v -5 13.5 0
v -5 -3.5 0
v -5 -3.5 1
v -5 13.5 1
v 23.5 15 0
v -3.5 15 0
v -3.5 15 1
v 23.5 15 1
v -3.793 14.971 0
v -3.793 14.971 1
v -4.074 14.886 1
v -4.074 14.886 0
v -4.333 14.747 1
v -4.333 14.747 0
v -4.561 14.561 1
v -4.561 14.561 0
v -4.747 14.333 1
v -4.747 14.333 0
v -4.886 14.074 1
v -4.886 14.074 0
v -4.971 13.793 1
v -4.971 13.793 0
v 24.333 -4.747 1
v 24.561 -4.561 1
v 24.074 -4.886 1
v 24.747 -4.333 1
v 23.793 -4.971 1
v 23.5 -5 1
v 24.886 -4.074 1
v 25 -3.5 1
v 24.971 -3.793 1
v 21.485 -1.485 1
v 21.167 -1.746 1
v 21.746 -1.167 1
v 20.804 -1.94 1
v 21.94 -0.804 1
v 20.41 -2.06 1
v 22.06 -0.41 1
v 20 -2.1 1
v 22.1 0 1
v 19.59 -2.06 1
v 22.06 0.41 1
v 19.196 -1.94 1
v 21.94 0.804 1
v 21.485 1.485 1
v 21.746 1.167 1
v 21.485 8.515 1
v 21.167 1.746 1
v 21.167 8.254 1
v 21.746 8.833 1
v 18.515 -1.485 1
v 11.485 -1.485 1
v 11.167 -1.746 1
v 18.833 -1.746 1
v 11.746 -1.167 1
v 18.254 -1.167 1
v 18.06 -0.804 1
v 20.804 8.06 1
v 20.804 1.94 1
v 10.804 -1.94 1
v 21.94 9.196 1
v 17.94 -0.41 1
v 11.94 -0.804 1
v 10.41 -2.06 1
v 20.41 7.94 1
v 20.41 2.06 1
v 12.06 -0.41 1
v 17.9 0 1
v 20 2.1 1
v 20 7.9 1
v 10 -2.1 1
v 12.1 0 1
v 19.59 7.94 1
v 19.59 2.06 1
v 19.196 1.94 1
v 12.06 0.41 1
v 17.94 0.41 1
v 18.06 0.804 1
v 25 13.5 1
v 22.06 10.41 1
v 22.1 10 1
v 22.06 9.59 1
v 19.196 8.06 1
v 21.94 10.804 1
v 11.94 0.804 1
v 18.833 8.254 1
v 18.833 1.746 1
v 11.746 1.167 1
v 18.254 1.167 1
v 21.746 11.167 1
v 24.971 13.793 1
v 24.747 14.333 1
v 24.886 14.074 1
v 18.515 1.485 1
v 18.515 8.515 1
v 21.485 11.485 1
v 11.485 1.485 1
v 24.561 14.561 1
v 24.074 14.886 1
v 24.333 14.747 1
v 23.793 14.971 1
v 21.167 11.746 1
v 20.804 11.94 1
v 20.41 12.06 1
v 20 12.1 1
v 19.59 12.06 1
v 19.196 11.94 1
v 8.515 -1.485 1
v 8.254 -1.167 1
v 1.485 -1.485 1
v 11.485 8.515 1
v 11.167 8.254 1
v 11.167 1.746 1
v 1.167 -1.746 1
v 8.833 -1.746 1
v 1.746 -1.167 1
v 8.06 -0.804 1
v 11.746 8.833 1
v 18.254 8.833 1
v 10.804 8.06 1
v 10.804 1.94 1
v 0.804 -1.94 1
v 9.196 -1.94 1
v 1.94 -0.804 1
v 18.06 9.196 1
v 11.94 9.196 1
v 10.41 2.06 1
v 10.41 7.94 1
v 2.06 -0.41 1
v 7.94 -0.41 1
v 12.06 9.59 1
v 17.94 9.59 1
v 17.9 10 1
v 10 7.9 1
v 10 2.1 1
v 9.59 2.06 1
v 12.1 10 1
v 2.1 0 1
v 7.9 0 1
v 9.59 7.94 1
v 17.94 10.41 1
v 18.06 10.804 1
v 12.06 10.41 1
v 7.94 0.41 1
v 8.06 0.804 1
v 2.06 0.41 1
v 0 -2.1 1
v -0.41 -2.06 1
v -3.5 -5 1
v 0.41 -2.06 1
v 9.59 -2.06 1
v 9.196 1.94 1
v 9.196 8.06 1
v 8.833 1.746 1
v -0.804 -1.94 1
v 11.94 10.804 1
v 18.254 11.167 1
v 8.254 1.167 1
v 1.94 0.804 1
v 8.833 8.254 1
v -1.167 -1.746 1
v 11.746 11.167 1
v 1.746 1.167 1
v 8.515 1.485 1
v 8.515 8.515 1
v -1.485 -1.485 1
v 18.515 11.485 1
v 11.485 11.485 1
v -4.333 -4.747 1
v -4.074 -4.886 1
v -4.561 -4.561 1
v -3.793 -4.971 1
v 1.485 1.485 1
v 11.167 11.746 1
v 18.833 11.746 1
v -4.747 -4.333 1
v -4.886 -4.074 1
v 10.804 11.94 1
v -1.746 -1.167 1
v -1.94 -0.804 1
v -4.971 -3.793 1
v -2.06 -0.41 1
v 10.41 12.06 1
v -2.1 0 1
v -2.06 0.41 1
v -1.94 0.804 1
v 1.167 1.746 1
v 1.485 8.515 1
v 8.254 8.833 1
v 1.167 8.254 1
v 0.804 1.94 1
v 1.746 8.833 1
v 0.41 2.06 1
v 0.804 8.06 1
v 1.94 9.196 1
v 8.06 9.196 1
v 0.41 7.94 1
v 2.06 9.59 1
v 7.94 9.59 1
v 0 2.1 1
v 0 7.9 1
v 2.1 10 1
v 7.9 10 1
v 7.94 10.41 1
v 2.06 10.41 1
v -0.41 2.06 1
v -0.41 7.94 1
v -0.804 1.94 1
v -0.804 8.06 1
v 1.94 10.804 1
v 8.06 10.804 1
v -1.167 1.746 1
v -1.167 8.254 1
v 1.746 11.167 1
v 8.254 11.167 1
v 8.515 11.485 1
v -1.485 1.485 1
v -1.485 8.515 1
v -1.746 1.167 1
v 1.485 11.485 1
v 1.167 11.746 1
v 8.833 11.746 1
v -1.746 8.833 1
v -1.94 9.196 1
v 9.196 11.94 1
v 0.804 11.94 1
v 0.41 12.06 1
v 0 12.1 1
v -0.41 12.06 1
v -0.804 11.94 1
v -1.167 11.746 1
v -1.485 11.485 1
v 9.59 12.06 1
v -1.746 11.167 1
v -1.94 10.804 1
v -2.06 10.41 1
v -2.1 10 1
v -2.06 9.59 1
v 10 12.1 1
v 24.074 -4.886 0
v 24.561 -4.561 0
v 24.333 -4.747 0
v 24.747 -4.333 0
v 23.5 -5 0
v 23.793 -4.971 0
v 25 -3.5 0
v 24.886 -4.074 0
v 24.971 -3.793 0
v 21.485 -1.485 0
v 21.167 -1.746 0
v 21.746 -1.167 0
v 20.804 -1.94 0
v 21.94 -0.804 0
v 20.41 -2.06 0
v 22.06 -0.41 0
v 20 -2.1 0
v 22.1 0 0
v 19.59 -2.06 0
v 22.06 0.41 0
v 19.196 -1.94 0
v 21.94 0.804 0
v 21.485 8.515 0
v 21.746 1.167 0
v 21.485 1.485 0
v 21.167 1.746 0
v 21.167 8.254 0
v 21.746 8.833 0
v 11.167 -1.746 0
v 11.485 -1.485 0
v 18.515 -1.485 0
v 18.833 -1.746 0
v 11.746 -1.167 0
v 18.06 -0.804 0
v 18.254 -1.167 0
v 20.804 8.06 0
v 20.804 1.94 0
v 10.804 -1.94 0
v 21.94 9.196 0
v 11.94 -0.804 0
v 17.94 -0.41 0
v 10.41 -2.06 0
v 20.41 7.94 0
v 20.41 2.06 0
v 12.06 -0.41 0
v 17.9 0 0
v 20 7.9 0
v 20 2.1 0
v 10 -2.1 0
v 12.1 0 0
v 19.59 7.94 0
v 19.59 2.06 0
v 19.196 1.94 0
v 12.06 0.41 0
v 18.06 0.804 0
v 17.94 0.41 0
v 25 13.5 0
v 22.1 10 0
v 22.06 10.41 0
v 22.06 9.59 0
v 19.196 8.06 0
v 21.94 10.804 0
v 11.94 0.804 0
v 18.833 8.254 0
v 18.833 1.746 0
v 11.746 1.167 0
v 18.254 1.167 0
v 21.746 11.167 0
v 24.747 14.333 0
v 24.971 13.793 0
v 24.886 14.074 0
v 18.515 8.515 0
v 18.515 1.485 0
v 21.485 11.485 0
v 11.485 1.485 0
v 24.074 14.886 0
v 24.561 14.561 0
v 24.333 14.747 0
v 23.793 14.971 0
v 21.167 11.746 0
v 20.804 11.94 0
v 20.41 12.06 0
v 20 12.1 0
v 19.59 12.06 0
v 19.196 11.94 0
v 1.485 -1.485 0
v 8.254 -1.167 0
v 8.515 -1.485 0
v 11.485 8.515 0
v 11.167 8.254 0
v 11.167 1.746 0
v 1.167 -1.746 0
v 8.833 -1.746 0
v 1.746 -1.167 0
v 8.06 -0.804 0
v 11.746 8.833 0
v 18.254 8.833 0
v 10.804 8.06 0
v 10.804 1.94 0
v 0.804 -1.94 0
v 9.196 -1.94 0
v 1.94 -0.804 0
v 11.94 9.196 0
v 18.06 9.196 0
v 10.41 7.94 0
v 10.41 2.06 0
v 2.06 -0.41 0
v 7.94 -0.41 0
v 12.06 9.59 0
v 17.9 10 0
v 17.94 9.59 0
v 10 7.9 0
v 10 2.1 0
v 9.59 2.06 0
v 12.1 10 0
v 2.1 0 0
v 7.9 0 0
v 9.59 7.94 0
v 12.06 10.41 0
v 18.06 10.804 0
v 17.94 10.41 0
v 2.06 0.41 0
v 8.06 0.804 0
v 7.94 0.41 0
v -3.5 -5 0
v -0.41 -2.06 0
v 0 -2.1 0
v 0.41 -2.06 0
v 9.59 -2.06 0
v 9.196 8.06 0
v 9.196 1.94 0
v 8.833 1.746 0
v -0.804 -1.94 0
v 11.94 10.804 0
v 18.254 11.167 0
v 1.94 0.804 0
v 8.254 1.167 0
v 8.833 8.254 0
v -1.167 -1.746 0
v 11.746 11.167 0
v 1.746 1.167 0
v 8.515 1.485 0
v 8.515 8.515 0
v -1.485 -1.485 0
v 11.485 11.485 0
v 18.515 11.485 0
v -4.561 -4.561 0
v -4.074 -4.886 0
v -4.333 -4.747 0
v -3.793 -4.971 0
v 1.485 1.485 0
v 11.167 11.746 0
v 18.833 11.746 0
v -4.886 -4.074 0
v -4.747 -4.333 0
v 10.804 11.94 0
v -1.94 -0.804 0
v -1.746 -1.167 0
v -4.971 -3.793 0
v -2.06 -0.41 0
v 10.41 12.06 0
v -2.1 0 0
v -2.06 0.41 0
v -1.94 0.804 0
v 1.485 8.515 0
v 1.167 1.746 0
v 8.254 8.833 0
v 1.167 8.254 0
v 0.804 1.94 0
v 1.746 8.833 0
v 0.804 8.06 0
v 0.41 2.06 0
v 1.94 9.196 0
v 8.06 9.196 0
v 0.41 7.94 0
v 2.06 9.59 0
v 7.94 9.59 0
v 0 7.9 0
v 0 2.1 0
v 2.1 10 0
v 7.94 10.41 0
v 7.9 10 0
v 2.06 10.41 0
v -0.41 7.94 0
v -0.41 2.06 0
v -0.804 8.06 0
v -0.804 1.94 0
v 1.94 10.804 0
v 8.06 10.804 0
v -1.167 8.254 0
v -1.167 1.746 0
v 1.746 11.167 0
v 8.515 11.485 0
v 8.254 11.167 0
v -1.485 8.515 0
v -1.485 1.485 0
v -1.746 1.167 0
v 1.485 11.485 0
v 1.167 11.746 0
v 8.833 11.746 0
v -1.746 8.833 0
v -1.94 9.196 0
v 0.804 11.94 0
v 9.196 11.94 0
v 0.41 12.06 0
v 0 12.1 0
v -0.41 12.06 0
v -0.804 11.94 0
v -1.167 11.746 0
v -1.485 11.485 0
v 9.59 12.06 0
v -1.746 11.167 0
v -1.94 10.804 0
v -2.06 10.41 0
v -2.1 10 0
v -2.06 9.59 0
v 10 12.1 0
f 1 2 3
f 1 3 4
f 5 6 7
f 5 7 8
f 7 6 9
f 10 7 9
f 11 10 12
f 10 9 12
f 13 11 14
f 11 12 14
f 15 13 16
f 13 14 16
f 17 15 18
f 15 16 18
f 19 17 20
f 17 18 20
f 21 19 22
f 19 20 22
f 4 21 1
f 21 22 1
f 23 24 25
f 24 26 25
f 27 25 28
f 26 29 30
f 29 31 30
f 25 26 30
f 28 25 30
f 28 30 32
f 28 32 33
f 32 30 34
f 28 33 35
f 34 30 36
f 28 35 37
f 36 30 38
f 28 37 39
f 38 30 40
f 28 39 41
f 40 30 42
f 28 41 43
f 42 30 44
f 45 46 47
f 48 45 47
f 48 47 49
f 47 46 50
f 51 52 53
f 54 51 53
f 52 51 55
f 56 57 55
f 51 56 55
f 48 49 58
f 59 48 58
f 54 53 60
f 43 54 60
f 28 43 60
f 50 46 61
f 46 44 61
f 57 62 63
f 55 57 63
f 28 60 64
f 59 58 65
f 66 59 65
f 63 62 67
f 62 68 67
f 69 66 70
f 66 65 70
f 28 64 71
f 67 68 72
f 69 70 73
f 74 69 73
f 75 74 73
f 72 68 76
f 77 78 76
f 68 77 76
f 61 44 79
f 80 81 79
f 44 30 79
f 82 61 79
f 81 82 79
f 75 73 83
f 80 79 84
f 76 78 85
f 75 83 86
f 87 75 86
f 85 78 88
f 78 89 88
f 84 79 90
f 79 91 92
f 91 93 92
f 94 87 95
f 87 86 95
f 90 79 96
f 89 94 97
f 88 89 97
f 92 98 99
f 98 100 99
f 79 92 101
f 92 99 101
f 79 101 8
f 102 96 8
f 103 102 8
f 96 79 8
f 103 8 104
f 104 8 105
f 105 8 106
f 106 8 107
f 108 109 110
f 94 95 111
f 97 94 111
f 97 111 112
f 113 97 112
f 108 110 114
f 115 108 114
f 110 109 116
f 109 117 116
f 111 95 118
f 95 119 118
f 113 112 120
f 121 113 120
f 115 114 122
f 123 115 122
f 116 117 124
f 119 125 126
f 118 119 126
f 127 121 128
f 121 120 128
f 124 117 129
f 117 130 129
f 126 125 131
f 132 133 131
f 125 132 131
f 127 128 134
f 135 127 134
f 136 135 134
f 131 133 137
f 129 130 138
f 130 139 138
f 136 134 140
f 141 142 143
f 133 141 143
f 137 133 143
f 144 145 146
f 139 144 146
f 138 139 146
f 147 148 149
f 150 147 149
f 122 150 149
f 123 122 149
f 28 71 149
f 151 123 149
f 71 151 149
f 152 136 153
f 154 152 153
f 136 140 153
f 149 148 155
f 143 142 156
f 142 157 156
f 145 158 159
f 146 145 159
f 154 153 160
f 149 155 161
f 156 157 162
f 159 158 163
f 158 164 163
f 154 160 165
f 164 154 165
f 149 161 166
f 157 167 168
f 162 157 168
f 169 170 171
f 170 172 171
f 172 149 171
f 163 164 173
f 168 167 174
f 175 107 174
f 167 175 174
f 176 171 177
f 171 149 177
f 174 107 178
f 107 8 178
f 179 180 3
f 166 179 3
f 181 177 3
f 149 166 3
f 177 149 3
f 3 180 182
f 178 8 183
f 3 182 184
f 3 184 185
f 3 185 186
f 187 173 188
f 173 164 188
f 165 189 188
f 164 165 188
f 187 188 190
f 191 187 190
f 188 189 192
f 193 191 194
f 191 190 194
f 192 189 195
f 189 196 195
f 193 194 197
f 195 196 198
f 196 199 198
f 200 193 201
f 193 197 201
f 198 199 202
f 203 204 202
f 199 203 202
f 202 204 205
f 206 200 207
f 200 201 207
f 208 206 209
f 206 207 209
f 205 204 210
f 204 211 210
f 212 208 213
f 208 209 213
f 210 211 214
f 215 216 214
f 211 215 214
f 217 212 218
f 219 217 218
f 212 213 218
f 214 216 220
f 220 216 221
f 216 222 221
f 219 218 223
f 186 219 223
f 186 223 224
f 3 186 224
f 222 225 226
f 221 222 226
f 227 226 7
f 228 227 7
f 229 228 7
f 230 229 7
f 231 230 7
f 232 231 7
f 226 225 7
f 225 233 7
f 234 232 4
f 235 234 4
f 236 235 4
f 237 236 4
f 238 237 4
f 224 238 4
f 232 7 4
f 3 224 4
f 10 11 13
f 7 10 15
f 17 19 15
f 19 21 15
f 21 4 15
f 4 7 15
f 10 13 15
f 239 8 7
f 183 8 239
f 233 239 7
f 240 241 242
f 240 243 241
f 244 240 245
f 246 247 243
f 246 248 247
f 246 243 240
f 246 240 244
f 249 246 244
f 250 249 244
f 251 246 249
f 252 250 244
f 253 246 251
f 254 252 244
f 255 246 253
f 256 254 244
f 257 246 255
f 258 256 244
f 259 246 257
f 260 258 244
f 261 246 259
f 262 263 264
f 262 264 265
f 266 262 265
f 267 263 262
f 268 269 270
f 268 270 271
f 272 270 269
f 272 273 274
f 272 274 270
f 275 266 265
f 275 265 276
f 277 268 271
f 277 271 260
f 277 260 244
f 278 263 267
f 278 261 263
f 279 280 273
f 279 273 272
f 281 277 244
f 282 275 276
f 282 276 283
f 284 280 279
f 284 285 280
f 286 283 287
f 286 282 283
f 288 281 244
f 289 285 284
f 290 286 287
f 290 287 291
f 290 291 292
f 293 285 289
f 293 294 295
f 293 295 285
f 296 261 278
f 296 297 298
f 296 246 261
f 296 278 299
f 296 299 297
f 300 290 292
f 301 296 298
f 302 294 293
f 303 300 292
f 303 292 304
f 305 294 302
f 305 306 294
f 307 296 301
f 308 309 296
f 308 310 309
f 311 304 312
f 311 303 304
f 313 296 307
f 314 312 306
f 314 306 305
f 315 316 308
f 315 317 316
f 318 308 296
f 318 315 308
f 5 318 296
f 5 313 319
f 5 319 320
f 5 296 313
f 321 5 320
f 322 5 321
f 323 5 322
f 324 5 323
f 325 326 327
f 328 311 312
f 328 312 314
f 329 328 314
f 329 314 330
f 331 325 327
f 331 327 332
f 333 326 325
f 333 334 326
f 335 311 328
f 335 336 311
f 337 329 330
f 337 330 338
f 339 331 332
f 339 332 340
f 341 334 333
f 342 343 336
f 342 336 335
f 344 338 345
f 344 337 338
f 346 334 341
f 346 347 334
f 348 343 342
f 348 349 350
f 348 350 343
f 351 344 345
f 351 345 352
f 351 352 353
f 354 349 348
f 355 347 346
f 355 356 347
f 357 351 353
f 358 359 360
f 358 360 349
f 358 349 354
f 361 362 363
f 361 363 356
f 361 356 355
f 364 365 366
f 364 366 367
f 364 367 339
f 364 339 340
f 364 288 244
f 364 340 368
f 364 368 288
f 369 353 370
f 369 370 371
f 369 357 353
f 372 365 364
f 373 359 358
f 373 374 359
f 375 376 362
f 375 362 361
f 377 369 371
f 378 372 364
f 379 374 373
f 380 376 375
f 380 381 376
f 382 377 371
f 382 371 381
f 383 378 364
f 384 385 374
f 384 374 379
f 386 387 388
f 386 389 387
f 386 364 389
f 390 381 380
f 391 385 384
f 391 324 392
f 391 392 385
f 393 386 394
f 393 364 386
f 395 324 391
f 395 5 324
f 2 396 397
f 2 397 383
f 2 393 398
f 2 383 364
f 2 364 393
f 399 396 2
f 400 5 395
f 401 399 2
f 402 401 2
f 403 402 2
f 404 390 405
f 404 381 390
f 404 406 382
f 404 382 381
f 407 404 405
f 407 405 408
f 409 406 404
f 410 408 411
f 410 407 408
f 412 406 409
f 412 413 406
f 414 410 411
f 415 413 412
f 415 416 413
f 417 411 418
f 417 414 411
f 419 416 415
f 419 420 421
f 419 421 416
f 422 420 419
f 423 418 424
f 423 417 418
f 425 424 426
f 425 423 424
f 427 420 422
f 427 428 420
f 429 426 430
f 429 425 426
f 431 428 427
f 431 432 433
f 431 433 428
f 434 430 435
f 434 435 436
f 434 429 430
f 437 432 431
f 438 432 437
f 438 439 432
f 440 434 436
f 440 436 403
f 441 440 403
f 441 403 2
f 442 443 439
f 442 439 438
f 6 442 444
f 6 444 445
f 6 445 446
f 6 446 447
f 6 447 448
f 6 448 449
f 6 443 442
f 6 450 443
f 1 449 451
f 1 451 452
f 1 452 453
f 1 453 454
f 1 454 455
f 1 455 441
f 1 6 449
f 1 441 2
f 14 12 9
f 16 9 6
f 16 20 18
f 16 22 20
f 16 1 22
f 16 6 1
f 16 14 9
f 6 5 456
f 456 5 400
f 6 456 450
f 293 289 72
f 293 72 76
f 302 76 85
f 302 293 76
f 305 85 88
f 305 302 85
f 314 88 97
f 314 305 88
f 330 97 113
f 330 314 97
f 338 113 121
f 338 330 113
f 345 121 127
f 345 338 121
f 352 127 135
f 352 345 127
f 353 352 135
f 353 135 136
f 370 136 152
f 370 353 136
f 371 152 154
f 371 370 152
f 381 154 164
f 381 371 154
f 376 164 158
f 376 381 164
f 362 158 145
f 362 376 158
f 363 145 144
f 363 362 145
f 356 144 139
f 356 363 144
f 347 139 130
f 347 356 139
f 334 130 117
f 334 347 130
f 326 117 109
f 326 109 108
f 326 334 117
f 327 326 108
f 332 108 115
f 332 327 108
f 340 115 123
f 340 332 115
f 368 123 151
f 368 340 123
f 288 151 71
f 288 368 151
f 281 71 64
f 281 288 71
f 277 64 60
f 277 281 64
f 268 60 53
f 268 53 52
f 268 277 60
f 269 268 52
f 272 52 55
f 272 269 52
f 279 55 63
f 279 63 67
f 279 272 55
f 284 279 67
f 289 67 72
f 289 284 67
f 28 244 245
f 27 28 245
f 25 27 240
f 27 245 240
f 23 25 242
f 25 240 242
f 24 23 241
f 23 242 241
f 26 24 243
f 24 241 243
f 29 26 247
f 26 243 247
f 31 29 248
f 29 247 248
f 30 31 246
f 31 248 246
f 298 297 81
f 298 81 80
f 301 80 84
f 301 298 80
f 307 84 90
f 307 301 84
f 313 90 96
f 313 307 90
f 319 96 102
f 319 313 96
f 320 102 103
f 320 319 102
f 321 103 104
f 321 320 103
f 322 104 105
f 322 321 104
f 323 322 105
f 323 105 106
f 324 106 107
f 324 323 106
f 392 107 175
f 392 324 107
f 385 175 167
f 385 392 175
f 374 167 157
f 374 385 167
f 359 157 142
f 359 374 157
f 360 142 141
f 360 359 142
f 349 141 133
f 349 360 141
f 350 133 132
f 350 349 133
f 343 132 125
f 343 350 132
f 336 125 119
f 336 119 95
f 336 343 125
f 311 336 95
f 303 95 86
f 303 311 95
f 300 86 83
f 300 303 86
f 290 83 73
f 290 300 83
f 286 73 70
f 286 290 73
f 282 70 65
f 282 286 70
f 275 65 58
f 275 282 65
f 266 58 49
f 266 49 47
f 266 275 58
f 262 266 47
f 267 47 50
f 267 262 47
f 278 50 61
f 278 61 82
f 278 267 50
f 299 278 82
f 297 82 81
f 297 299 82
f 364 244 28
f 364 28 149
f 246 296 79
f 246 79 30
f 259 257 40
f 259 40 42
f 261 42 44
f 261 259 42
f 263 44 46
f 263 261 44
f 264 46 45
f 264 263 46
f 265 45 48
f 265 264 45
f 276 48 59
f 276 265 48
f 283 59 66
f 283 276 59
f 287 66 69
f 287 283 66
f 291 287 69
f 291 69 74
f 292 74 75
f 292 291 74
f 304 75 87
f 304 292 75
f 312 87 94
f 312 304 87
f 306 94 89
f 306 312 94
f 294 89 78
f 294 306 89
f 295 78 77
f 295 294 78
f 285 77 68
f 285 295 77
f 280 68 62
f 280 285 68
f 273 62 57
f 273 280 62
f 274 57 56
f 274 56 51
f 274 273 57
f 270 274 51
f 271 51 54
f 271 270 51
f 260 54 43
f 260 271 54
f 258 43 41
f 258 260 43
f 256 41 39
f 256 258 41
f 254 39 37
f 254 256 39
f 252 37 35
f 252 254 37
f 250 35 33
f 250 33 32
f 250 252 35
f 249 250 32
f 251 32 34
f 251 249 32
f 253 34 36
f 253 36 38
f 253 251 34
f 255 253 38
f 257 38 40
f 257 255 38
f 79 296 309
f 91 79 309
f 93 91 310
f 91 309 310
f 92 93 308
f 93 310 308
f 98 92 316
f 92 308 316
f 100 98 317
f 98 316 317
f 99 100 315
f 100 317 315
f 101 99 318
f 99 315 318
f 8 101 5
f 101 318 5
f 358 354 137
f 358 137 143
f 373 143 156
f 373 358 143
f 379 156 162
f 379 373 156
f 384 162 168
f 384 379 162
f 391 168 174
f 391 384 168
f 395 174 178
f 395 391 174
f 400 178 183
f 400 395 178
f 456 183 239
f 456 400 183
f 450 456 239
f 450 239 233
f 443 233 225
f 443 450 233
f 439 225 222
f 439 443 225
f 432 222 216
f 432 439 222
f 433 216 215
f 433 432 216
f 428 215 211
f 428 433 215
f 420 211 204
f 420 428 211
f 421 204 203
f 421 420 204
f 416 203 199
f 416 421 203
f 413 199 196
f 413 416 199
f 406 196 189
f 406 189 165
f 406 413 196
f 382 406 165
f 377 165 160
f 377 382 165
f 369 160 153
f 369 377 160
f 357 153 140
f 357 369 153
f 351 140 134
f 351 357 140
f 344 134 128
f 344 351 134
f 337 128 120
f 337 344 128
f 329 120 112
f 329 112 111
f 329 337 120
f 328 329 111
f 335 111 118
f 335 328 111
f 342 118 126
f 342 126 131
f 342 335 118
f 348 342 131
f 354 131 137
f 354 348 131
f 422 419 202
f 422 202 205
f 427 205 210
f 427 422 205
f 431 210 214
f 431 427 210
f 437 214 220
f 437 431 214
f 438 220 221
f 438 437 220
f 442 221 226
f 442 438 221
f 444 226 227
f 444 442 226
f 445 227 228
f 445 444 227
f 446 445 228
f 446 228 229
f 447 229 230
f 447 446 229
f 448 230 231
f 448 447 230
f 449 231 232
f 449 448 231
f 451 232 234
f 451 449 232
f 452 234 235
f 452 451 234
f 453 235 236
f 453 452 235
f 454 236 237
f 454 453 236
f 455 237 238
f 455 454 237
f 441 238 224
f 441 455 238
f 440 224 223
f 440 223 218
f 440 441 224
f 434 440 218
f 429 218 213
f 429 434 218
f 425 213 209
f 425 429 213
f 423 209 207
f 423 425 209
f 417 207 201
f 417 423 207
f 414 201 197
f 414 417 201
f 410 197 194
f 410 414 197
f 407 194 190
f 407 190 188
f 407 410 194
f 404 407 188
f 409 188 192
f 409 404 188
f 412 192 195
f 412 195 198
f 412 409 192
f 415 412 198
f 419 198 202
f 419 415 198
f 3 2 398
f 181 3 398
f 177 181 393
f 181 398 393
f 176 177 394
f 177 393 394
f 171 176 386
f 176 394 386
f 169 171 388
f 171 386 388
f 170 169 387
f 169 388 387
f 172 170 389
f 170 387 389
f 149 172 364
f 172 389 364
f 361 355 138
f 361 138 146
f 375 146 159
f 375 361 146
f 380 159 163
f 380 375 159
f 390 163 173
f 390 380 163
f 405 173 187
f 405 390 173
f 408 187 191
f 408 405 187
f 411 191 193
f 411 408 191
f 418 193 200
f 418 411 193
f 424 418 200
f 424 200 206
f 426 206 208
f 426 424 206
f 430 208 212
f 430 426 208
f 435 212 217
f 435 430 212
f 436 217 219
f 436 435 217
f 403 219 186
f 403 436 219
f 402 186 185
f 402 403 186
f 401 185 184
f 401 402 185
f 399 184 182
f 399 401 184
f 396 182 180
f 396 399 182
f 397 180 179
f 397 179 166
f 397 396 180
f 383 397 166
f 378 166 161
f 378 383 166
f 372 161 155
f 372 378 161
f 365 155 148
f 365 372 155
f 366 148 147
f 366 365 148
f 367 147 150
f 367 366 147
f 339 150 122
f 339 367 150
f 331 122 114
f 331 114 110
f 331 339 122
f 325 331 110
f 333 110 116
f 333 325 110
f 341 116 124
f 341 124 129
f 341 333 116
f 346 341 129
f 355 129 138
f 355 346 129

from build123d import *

# Parameters (mm, degrees)
SKETCH_R  = 2.1
PAD_DEPTH = 1


with BuildPart() as part:
    # Sketch → Pad (new body)
    with BuildSketch(Plane.XY):
        with BuildLine():
            Line((-3.5, 15), (23.5, 15))
            ThreePointArc((25, 13.5), (24.56066, 14.56066), (23.5, 15))
            Line((25, 13.5), (25, -3.5))
            ThreePointArc((23.5, -5), (24.56066, -4.56066), (25, -3.5))
            Line((23.5, -5), (-3.5, -5))
            ThreePointArc((-5, -3.5), (-4.56066, -4.56066), (-3.5, -5))
            Line((-5, -3.5), (-5, 13.5))
            ThreePointArc((-3.5, 15), (-4.56066, 14.56066), (-5, 13.5))
        make_face()
        Circle(SKETCH_R, mode=Mode.SUBTRACT)
        with Locations((0, 10)):
            Circle(SKETCH_R, mode=Mode.SUBTRACT)
        with Locations((10, 0)):
            Circle(SKETCH_R, mode=Mode.SUBTRACT)
        with Locations((20, 0)):
            Circle(SKETCH_R, mode=Mode.SUBTRACT)
        with Locations((10, 10)):
            Circle(SKETCH_R, mode=Mode.SUBTRACT)
        with Locations((20, 10)):
            Circle(SKETCH_R, mode=Mode.SUBTRACT)
    extrude(amount=PAD_DEPTH)


solid = part.part
